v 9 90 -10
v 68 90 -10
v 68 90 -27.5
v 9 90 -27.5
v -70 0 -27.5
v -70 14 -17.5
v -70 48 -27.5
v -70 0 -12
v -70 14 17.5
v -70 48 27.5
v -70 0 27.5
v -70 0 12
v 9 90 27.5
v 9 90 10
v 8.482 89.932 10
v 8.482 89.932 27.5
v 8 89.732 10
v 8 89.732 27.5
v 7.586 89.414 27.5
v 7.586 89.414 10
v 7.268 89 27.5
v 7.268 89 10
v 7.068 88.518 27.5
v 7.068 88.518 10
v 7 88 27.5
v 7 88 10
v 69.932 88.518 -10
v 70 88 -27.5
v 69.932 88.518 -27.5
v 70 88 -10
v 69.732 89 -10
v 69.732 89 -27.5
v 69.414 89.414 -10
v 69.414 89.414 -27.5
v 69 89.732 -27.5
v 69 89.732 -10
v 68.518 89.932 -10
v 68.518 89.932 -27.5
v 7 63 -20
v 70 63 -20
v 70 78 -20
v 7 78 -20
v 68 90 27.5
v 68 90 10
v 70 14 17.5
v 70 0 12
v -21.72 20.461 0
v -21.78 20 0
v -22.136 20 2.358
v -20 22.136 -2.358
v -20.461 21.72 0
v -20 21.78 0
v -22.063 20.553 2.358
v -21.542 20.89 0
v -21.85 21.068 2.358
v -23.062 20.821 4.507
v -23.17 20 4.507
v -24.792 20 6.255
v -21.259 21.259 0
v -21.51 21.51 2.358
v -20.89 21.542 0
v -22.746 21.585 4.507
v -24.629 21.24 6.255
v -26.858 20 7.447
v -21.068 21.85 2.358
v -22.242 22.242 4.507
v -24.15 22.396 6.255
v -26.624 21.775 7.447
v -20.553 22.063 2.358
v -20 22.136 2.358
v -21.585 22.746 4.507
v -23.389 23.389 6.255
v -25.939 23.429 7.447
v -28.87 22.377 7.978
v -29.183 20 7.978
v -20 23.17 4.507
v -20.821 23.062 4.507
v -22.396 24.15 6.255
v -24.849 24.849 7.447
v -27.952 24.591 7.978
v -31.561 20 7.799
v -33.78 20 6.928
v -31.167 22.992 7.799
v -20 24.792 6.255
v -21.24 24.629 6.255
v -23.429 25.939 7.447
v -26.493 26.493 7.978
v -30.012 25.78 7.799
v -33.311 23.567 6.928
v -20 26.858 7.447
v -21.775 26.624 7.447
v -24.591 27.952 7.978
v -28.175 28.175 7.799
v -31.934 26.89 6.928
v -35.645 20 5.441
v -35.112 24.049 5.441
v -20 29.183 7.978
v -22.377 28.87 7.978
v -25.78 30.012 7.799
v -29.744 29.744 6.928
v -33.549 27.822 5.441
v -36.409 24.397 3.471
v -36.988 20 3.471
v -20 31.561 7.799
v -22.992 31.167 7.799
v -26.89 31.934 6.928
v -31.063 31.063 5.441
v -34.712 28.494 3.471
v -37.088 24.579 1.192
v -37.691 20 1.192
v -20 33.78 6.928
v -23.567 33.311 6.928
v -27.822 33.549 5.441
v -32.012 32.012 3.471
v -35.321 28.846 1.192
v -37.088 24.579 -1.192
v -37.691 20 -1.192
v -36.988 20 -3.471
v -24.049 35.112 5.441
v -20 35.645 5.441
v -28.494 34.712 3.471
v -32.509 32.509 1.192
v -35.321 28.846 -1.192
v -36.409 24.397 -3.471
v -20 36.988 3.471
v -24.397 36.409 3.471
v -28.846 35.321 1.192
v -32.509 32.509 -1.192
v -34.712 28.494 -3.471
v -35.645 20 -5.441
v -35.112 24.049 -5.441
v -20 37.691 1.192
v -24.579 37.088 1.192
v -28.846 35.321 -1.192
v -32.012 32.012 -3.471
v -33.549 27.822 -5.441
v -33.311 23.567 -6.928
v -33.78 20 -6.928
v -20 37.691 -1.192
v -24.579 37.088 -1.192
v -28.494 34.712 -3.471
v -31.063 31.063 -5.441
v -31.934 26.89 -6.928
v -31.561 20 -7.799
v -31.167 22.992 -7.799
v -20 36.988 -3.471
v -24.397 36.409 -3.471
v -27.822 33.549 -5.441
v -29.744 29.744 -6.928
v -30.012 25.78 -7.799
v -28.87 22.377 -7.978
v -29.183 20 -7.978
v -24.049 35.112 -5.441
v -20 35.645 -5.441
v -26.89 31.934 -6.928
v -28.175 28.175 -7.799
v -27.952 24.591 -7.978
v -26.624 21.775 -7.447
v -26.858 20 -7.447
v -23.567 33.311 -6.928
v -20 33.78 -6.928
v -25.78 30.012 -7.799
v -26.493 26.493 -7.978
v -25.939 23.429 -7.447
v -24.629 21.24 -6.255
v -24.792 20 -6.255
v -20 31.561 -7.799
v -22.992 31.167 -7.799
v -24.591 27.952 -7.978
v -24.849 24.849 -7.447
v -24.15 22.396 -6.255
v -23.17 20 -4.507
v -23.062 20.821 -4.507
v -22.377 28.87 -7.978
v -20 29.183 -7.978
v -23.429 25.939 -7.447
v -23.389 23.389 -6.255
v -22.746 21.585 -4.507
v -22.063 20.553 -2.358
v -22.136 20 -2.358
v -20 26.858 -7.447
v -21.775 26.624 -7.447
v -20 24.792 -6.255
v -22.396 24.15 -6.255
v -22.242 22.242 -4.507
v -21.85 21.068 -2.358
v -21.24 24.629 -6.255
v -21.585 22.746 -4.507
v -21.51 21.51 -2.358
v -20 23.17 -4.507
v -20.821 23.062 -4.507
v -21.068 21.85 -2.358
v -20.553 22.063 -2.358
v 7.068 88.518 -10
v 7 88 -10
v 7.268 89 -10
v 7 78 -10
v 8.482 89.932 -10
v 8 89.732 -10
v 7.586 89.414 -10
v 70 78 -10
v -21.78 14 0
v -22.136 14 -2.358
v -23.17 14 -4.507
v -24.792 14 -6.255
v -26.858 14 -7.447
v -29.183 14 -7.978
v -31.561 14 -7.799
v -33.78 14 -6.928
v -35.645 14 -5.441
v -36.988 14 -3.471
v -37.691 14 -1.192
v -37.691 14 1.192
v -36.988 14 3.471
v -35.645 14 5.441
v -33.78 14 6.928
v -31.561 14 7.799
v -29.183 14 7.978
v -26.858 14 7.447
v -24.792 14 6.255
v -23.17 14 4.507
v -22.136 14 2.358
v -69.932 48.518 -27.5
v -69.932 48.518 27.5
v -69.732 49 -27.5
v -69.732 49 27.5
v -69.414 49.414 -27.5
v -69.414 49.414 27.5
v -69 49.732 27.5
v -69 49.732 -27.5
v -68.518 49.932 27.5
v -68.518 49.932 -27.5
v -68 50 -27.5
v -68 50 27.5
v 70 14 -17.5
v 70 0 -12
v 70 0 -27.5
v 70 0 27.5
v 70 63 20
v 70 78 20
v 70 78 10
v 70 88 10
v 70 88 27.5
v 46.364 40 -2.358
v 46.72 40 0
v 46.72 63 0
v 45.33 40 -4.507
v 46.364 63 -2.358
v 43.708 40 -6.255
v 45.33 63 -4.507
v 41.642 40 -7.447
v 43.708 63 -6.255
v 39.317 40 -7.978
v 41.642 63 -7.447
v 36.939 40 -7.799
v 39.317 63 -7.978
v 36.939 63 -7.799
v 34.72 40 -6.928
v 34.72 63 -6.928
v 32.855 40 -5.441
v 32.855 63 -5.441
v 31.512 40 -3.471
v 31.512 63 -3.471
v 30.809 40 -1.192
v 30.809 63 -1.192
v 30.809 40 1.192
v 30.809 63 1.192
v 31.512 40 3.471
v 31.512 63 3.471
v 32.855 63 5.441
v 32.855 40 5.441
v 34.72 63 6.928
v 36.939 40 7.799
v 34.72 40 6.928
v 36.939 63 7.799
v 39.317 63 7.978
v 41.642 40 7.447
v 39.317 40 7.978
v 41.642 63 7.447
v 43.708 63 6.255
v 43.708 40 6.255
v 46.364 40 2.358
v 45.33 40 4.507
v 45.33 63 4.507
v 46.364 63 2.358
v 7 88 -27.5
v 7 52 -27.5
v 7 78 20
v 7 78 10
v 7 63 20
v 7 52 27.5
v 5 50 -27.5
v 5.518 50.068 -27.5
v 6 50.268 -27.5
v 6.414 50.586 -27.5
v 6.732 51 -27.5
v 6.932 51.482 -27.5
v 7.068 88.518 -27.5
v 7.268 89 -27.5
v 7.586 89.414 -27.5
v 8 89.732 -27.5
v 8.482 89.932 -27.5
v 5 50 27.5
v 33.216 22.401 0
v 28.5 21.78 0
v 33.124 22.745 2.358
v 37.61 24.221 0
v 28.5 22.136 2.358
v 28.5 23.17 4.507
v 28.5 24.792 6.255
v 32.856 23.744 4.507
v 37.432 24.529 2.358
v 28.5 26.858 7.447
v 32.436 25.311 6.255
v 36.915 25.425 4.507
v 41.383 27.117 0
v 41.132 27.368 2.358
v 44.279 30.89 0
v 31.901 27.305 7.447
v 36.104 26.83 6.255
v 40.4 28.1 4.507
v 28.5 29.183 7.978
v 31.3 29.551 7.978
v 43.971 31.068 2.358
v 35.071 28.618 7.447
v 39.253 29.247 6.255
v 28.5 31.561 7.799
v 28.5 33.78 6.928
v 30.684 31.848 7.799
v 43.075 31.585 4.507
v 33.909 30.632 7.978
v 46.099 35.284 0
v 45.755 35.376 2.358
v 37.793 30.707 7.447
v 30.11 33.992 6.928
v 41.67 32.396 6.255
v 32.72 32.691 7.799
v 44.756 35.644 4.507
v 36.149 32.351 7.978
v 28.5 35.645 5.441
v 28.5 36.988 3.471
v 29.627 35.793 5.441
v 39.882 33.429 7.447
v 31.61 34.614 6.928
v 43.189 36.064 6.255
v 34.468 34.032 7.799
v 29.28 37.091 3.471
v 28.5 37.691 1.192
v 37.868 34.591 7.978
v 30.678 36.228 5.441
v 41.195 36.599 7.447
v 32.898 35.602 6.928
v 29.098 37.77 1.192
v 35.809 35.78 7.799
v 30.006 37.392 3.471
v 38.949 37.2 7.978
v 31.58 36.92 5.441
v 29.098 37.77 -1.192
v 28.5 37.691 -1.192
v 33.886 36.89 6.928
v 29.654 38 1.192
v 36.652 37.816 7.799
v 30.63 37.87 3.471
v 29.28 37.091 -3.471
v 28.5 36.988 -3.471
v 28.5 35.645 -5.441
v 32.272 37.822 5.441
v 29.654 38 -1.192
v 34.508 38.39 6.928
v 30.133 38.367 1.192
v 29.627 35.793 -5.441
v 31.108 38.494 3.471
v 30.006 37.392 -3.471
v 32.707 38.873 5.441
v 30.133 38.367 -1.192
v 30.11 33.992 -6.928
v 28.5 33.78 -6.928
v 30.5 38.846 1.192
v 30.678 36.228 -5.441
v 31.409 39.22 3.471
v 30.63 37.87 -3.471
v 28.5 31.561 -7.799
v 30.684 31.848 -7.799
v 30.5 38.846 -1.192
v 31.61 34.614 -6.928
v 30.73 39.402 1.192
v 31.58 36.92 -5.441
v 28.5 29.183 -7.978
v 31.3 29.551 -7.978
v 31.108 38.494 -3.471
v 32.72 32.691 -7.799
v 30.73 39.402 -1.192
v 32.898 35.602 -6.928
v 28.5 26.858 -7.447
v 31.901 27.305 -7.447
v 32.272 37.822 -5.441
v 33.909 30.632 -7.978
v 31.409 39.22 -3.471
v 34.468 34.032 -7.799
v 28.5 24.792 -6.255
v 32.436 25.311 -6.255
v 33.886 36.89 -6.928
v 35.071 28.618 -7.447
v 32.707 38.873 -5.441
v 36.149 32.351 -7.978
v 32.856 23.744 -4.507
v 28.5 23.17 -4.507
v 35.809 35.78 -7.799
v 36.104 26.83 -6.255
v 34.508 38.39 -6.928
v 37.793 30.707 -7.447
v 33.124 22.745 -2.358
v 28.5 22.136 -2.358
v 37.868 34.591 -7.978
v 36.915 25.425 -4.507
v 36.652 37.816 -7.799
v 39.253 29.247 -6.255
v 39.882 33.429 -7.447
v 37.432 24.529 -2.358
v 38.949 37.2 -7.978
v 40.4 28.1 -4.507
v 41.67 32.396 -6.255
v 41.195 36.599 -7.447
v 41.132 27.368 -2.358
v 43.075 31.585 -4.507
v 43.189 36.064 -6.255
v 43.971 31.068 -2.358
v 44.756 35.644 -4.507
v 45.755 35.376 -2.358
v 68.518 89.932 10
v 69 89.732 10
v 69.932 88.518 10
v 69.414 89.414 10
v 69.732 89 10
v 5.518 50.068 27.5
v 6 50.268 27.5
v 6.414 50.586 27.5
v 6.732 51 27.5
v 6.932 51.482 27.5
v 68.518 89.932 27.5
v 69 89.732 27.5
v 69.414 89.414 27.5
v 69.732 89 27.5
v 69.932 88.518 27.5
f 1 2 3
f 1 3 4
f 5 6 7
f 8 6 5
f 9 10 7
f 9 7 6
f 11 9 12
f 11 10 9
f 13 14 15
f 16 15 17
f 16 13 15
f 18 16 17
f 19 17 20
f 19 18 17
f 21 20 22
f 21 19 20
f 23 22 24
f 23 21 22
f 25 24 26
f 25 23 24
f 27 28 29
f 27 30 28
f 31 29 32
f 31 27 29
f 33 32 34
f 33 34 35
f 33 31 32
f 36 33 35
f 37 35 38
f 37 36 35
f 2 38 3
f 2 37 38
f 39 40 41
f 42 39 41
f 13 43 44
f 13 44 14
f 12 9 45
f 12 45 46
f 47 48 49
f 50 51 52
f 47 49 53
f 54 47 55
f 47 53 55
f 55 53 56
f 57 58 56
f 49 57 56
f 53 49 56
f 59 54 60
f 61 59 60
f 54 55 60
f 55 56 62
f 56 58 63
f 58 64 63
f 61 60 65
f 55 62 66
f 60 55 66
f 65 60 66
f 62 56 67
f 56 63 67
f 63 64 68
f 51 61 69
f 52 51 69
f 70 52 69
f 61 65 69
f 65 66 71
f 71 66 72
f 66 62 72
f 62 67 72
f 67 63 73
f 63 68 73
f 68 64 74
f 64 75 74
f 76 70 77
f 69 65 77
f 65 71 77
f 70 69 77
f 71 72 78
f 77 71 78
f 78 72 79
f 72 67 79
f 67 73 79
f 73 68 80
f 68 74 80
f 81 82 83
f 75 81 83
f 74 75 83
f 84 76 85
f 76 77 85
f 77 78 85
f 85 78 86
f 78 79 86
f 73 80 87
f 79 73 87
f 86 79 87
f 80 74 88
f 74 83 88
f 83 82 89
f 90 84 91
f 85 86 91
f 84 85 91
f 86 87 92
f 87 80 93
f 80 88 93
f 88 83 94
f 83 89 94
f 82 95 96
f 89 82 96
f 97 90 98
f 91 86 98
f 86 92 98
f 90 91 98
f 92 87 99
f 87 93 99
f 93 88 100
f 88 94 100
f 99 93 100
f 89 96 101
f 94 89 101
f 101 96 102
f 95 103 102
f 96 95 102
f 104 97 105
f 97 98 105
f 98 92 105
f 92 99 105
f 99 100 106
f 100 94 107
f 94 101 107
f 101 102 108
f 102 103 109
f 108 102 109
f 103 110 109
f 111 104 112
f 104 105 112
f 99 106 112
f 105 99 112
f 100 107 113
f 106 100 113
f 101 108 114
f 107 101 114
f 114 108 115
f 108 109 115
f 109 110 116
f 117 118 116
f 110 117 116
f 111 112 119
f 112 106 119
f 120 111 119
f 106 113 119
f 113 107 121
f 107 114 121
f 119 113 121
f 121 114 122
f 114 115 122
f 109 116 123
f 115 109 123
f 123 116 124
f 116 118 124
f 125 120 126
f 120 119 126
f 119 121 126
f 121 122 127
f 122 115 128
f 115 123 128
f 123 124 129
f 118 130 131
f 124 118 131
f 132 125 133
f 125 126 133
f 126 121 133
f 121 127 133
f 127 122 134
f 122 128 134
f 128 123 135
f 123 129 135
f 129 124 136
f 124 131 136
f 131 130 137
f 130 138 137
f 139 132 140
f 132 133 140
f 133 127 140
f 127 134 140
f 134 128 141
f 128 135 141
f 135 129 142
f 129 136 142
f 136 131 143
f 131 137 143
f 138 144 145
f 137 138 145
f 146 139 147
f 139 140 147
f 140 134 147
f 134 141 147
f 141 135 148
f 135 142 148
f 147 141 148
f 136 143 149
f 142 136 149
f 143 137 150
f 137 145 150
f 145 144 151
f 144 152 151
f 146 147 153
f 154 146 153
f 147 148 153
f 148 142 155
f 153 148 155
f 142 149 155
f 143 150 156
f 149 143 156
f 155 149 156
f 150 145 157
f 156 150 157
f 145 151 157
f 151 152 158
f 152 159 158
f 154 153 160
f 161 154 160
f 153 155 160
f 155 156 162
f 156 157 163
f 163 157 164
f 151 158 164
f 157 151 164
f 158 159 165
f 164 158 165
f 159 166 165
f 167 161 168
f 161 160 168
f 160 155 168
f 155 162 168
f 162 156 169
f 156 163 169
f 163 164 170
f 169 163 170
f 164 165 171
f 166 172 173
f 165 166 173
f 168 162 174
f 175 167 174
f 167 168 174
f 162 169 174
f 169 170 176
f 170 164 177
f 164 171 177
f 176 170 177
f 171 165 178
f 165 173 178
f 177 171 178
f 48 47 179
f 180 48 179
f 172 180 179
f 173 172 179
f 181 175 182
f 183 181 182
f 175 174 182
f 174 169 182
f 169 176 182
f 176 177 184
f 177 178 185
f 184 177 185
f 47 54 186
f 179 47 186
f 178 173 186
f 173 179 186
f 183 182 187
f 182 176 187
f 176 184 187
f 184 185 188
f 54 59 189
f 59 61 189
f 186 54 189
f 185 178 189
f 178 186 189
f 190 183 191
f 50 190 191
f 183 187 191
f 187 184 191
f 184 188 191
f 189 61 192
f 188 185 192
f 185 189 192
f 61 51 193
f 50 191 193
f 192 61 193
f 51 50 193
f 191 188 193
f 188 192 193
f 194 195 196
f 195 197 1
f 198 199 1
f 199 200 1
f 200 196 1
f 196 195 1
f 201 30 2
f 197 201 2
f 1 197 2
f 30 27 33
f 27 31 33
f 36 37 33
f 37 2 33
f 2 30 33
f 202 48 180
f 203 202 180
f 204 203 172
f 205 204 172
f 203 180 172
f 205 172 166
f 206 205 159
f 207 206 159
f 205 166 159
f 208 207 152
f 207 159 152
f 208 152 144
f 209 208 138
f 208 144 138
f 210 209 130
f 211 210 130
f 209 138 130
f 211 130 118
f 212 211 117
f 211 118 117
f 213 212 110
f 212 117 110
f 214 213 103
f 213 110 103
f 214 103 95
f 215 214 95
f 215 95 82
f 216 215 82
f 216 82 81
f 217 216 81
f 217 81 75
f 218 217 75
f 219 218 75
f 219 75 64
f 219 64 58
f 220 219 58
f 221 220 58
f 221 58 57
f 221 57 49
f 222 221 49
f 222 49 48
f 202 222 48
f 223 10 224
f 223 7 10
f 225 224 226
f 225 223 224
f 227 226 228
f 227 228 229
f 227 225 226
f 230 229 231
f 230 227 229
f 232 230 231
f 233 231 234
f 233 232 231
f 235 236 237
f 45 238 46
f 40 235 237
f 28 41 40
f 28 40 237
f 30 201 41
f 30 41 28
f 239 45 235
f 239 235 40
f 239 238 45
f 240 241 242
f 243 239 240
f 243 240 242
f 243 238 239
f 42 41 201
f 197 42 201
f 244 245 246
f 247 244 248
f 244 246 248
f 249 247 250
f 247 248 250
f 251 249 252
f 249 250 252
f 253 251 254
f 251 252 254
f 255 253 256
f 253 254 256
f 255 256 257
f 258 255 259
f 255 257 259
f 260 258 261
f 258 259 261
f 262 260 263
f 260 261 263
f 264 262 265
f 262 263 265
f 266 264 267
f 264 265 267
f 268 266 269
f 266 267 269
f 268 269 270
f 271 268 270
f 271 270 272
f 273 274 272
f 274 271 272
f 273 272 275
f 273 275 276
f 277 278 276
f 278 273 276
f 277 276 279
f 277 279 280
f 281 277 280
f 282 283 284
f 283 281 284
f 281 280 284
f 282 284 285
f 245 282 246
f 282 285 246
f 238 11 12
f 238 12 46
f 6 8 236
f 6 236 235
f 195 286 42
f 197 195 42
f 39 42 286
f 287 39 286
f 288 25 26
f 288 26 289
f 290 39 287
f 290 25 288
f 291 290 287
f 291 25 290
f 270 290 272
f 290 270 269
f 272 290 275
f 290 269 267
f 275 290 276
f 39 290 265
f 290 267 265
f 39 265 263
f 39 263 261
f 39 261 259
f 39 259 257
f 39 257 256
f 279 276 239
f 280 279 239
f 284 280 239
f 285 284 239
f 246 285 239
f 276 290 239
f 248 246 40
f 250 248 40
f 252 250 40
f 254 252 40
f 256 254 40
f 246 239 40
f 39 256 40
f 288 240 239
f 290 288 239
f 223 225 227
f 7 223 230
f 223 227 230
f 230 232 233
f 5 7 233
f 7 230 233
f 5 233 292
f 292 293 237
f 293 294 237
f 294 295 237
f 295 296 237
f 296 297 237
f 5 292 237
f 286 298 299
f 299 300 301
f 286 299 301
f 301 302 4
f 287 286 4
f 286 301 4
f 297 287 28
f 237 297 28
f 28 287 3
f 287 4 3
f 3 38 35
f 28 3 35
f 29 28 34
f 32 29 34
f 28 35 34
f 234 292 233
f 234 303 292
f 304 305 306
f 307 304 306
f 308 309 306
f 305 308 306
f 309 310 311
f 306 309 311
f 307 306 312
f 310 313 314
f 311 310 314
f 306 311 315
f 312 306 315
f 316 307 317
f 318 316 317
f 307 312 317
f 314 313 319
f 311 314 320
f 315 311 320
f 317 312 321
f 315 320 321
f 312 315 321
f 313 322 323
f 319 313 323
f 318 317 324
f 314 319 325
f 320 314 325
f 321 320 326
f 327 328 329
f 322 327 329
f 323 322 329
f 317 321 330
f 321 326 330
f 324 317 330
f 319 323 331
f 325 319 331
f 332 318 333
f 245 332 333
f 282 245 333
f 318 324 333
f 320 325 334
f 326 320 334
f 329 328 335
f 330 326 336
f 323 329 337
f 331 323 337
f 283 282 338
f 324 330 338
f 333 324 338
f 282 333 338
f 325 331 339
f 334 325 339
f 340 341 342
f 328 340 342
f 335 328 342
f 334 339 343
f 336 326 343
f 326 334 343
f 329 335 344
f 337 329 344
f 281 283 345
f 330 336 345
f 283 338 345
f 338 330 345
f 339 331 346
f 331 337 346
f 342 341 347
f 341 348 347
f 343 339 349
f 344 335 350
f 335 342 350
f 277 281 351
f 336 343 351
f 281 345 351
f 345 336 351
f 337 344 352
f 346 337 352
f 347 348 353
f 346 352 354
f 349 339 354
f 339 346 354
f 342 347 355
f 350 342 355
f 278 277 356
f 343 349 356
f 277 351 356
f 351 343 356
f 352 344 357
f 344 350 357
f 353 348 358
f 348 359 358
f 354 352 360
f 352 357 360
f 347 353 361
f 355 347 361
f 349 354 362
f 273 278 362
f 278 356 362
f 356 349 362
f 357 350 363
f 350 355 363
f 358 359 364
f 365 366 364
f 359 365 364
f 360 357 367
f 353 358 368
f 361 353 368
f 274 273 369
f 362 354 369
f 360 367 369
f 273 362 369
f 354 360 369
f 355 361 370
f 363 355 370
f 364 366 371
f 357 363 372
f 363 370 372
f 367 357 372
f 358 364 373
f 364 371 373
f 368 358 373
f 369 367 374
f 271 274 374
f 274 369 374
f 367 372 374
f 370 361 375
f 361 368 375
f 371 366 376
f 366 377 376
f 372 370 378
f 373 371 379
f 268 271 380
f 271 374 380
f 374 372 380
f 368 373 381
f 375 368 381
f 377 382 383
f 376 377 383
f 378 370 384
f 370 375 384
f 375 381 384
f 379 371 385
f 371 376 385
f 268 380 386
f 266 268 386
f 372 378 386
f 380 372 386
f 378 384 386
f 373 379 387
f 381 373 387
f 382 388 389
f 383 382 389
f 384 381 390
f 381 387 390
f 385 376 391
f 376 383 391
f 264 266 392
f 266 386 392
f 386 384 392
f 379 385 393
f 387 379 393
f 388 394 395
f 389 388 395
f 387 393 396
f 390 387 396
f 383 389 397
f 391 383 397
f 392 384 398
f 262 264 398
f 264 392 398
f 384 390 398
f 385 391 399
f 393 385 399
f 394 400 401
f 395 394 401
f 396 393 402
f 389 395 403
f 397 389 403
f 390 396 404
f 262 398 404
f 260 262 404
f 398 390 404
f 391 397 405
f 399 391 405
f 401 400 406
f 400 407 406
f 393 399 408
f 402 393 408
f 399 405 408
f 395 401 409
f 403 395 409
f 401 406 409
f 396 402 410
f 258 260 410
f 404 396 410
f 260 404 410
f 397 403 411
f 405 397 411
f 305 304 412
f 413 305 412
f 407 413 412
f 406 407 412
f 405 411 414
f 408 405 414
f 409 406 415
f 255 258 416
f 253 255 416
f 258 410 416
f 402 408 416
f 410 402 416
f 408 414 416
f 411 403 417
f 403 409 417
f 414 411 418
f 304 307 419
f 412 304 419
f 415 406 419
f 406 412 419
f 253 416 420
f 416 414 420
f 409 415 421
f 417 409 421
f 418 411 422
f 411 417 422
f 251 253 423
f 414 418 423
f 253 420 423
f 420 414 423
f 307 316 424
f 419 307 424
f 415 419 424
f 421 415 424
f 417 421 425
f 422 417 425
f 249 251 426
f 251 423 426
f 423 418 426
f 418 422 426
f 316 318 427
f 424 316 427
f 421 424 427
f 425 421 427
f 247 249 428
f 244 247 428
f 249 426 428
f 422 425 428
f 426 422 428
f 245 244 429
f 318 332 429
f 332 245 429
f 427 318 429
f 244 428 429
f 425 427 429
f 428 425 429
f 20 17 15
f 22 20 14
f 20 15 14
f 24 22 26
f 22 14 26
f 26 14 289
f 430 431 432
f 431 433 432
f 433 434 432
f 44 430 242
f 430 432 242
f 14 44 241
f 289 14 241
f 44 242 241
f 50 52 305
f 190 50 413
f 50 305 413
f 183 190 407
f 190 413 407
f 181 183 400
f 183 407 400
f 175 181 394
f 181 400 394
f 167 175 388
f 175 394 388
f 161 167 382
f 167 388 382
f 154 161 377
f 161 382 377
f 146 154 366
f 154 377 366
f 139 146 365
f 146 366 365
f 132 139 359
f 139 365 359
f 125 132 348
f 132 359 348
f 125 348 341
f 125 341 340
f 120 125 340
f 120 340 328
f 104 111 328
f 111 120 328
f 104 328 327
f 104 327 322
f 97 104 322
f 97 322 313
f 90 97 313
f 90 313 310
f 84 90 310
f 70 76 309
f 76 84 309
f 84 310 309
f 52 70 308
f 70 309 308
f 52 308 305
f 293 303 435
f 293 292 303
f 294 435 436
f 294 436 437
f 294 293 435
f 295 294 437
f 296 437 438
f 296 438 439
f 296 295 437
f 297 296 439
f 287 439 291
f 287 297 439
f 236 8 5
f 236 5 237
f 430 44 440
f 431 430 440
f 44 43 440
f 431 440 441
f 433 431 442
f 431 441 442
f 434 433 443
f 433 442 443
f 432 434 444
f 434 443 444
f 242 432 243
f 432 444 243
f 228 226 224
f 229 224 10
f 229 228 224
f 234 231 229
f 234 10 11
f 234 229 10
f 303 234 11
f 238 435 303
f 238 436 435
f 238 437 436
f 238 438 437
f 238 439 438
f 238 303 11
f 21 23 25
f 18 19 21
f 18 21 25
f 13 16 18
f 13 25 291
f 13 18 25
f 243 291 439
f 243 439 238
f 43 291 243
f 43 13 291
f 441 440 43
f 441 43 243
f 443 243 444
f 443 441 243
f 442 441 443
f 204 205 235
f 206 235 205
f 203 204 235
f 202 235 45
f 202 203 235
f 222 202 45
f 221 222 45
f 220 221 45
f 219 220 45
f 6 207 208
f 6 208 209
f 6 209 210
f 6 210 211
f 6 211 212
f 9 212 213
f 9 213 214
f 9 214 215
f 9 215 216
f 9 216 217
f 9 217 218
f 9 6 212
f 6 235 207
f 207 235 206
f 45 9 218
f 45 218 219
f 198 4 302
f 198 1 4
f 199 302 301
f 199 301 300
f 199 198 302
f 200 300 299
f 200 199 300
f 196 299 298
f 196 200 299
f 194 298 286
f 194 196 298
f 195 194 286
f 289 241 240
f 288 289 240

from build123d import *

# Parameters (mm, degrees)
BOSS_EXTRUDE1_DEPTH = 27.5
CUT_EXTRUDE1_DEPTH  = 169.689804078
CUT_EXTRUDE2_DEPTH  = 63
SKETCH7_R           = 8
FILLET1_R           = 2
FILLET2_R           = 2


with BuildPart() as part:
    # Sketch1 → Boss-Extrude1 (new, symmetric)
    with BuildSketch(Plane.XY):
        Polygon((-70, 0), (70, 0), (70, 90), (7, 90), (7, 50), (-70, 50), align=None)
    extrude(amount=BOSS_EXTRUDE1_DEPTH, both=True)

    # Sketch3 → Cut-Extrude1 (cut, through all)
    with BuildSketch(Plane.ZY.offset(70)):
        Polygon((-12, 0), (-17.5, 14), (17.5, 14), (12, 0), align=None)
    extrude(amount=-CUT_EXTRUDE1_DEPTH, mode=Mode.SUBTRACT)

    # Sketch5 → Cut-Extrude2 (cut)
    with BuildSketch(Plane(origin=(70, 0, 0), x_dir=(0, 0, -1), z_dir=(1, 0, 0))):
        Polygon((-10, 90), (-10, 78), (-20, 78), (-20, 63), (20, 63), (20, 78), (10, 78), (10, 90), align=None)
    extrude(amount=-CUT_EXTRUDE2_DEPTH, mode=Mode.SUBTRACT)

    # Cut-Sweep2: sweep along a path in Sketch6
    with BuildLine(Plane.XY) as cut_sweep2_path:
        Line((-30, 14), (-30, 20))
        ThreePointArc((-30, 20), (-27.071067812, 27.071067812), (-20, 30))
        Line((-20, 30), (28.5, 30))
        ThreePointArc((28.5, 30), (35.571067812, 32.928932188), (38.5, 40))
        Line((38.5, 40), (38.5, 63))
    # Sketch7 → Cut-Sweep2 (sweep, cut)
    with BuildSketch(Plane(origin=(38.5, 63, 0), x_dir=(1, 0, 0), z_dir=(0, 1, 0))):
        with Locations((0.219622083, 0)):
            Circle(SKETCH7_R)
    sweep(path=cut_sweep2_path.line, mode=Mode.SUBTRACT)

    # Fillet1
    fillet1_edges = [part.edges().sort_by_distance(p)[0] for p in [
        (-70, 50, 0),
        (7, 50, 0),
        (7, 90, 18.75),
        (7, 90, -18.75),
    ]]
    fillet(fillet1_edges, radius=FILLET1_R)

    # Fillet2
    fillet2_edges = [part.edges().sort_by_distance(p)[0] for p in [
        (70, 90, 18.75),
        (70, 90, -18.75),
    ]]
    fillet(fillet2_edges, radius=FILLET2_R)


solid = part.part
